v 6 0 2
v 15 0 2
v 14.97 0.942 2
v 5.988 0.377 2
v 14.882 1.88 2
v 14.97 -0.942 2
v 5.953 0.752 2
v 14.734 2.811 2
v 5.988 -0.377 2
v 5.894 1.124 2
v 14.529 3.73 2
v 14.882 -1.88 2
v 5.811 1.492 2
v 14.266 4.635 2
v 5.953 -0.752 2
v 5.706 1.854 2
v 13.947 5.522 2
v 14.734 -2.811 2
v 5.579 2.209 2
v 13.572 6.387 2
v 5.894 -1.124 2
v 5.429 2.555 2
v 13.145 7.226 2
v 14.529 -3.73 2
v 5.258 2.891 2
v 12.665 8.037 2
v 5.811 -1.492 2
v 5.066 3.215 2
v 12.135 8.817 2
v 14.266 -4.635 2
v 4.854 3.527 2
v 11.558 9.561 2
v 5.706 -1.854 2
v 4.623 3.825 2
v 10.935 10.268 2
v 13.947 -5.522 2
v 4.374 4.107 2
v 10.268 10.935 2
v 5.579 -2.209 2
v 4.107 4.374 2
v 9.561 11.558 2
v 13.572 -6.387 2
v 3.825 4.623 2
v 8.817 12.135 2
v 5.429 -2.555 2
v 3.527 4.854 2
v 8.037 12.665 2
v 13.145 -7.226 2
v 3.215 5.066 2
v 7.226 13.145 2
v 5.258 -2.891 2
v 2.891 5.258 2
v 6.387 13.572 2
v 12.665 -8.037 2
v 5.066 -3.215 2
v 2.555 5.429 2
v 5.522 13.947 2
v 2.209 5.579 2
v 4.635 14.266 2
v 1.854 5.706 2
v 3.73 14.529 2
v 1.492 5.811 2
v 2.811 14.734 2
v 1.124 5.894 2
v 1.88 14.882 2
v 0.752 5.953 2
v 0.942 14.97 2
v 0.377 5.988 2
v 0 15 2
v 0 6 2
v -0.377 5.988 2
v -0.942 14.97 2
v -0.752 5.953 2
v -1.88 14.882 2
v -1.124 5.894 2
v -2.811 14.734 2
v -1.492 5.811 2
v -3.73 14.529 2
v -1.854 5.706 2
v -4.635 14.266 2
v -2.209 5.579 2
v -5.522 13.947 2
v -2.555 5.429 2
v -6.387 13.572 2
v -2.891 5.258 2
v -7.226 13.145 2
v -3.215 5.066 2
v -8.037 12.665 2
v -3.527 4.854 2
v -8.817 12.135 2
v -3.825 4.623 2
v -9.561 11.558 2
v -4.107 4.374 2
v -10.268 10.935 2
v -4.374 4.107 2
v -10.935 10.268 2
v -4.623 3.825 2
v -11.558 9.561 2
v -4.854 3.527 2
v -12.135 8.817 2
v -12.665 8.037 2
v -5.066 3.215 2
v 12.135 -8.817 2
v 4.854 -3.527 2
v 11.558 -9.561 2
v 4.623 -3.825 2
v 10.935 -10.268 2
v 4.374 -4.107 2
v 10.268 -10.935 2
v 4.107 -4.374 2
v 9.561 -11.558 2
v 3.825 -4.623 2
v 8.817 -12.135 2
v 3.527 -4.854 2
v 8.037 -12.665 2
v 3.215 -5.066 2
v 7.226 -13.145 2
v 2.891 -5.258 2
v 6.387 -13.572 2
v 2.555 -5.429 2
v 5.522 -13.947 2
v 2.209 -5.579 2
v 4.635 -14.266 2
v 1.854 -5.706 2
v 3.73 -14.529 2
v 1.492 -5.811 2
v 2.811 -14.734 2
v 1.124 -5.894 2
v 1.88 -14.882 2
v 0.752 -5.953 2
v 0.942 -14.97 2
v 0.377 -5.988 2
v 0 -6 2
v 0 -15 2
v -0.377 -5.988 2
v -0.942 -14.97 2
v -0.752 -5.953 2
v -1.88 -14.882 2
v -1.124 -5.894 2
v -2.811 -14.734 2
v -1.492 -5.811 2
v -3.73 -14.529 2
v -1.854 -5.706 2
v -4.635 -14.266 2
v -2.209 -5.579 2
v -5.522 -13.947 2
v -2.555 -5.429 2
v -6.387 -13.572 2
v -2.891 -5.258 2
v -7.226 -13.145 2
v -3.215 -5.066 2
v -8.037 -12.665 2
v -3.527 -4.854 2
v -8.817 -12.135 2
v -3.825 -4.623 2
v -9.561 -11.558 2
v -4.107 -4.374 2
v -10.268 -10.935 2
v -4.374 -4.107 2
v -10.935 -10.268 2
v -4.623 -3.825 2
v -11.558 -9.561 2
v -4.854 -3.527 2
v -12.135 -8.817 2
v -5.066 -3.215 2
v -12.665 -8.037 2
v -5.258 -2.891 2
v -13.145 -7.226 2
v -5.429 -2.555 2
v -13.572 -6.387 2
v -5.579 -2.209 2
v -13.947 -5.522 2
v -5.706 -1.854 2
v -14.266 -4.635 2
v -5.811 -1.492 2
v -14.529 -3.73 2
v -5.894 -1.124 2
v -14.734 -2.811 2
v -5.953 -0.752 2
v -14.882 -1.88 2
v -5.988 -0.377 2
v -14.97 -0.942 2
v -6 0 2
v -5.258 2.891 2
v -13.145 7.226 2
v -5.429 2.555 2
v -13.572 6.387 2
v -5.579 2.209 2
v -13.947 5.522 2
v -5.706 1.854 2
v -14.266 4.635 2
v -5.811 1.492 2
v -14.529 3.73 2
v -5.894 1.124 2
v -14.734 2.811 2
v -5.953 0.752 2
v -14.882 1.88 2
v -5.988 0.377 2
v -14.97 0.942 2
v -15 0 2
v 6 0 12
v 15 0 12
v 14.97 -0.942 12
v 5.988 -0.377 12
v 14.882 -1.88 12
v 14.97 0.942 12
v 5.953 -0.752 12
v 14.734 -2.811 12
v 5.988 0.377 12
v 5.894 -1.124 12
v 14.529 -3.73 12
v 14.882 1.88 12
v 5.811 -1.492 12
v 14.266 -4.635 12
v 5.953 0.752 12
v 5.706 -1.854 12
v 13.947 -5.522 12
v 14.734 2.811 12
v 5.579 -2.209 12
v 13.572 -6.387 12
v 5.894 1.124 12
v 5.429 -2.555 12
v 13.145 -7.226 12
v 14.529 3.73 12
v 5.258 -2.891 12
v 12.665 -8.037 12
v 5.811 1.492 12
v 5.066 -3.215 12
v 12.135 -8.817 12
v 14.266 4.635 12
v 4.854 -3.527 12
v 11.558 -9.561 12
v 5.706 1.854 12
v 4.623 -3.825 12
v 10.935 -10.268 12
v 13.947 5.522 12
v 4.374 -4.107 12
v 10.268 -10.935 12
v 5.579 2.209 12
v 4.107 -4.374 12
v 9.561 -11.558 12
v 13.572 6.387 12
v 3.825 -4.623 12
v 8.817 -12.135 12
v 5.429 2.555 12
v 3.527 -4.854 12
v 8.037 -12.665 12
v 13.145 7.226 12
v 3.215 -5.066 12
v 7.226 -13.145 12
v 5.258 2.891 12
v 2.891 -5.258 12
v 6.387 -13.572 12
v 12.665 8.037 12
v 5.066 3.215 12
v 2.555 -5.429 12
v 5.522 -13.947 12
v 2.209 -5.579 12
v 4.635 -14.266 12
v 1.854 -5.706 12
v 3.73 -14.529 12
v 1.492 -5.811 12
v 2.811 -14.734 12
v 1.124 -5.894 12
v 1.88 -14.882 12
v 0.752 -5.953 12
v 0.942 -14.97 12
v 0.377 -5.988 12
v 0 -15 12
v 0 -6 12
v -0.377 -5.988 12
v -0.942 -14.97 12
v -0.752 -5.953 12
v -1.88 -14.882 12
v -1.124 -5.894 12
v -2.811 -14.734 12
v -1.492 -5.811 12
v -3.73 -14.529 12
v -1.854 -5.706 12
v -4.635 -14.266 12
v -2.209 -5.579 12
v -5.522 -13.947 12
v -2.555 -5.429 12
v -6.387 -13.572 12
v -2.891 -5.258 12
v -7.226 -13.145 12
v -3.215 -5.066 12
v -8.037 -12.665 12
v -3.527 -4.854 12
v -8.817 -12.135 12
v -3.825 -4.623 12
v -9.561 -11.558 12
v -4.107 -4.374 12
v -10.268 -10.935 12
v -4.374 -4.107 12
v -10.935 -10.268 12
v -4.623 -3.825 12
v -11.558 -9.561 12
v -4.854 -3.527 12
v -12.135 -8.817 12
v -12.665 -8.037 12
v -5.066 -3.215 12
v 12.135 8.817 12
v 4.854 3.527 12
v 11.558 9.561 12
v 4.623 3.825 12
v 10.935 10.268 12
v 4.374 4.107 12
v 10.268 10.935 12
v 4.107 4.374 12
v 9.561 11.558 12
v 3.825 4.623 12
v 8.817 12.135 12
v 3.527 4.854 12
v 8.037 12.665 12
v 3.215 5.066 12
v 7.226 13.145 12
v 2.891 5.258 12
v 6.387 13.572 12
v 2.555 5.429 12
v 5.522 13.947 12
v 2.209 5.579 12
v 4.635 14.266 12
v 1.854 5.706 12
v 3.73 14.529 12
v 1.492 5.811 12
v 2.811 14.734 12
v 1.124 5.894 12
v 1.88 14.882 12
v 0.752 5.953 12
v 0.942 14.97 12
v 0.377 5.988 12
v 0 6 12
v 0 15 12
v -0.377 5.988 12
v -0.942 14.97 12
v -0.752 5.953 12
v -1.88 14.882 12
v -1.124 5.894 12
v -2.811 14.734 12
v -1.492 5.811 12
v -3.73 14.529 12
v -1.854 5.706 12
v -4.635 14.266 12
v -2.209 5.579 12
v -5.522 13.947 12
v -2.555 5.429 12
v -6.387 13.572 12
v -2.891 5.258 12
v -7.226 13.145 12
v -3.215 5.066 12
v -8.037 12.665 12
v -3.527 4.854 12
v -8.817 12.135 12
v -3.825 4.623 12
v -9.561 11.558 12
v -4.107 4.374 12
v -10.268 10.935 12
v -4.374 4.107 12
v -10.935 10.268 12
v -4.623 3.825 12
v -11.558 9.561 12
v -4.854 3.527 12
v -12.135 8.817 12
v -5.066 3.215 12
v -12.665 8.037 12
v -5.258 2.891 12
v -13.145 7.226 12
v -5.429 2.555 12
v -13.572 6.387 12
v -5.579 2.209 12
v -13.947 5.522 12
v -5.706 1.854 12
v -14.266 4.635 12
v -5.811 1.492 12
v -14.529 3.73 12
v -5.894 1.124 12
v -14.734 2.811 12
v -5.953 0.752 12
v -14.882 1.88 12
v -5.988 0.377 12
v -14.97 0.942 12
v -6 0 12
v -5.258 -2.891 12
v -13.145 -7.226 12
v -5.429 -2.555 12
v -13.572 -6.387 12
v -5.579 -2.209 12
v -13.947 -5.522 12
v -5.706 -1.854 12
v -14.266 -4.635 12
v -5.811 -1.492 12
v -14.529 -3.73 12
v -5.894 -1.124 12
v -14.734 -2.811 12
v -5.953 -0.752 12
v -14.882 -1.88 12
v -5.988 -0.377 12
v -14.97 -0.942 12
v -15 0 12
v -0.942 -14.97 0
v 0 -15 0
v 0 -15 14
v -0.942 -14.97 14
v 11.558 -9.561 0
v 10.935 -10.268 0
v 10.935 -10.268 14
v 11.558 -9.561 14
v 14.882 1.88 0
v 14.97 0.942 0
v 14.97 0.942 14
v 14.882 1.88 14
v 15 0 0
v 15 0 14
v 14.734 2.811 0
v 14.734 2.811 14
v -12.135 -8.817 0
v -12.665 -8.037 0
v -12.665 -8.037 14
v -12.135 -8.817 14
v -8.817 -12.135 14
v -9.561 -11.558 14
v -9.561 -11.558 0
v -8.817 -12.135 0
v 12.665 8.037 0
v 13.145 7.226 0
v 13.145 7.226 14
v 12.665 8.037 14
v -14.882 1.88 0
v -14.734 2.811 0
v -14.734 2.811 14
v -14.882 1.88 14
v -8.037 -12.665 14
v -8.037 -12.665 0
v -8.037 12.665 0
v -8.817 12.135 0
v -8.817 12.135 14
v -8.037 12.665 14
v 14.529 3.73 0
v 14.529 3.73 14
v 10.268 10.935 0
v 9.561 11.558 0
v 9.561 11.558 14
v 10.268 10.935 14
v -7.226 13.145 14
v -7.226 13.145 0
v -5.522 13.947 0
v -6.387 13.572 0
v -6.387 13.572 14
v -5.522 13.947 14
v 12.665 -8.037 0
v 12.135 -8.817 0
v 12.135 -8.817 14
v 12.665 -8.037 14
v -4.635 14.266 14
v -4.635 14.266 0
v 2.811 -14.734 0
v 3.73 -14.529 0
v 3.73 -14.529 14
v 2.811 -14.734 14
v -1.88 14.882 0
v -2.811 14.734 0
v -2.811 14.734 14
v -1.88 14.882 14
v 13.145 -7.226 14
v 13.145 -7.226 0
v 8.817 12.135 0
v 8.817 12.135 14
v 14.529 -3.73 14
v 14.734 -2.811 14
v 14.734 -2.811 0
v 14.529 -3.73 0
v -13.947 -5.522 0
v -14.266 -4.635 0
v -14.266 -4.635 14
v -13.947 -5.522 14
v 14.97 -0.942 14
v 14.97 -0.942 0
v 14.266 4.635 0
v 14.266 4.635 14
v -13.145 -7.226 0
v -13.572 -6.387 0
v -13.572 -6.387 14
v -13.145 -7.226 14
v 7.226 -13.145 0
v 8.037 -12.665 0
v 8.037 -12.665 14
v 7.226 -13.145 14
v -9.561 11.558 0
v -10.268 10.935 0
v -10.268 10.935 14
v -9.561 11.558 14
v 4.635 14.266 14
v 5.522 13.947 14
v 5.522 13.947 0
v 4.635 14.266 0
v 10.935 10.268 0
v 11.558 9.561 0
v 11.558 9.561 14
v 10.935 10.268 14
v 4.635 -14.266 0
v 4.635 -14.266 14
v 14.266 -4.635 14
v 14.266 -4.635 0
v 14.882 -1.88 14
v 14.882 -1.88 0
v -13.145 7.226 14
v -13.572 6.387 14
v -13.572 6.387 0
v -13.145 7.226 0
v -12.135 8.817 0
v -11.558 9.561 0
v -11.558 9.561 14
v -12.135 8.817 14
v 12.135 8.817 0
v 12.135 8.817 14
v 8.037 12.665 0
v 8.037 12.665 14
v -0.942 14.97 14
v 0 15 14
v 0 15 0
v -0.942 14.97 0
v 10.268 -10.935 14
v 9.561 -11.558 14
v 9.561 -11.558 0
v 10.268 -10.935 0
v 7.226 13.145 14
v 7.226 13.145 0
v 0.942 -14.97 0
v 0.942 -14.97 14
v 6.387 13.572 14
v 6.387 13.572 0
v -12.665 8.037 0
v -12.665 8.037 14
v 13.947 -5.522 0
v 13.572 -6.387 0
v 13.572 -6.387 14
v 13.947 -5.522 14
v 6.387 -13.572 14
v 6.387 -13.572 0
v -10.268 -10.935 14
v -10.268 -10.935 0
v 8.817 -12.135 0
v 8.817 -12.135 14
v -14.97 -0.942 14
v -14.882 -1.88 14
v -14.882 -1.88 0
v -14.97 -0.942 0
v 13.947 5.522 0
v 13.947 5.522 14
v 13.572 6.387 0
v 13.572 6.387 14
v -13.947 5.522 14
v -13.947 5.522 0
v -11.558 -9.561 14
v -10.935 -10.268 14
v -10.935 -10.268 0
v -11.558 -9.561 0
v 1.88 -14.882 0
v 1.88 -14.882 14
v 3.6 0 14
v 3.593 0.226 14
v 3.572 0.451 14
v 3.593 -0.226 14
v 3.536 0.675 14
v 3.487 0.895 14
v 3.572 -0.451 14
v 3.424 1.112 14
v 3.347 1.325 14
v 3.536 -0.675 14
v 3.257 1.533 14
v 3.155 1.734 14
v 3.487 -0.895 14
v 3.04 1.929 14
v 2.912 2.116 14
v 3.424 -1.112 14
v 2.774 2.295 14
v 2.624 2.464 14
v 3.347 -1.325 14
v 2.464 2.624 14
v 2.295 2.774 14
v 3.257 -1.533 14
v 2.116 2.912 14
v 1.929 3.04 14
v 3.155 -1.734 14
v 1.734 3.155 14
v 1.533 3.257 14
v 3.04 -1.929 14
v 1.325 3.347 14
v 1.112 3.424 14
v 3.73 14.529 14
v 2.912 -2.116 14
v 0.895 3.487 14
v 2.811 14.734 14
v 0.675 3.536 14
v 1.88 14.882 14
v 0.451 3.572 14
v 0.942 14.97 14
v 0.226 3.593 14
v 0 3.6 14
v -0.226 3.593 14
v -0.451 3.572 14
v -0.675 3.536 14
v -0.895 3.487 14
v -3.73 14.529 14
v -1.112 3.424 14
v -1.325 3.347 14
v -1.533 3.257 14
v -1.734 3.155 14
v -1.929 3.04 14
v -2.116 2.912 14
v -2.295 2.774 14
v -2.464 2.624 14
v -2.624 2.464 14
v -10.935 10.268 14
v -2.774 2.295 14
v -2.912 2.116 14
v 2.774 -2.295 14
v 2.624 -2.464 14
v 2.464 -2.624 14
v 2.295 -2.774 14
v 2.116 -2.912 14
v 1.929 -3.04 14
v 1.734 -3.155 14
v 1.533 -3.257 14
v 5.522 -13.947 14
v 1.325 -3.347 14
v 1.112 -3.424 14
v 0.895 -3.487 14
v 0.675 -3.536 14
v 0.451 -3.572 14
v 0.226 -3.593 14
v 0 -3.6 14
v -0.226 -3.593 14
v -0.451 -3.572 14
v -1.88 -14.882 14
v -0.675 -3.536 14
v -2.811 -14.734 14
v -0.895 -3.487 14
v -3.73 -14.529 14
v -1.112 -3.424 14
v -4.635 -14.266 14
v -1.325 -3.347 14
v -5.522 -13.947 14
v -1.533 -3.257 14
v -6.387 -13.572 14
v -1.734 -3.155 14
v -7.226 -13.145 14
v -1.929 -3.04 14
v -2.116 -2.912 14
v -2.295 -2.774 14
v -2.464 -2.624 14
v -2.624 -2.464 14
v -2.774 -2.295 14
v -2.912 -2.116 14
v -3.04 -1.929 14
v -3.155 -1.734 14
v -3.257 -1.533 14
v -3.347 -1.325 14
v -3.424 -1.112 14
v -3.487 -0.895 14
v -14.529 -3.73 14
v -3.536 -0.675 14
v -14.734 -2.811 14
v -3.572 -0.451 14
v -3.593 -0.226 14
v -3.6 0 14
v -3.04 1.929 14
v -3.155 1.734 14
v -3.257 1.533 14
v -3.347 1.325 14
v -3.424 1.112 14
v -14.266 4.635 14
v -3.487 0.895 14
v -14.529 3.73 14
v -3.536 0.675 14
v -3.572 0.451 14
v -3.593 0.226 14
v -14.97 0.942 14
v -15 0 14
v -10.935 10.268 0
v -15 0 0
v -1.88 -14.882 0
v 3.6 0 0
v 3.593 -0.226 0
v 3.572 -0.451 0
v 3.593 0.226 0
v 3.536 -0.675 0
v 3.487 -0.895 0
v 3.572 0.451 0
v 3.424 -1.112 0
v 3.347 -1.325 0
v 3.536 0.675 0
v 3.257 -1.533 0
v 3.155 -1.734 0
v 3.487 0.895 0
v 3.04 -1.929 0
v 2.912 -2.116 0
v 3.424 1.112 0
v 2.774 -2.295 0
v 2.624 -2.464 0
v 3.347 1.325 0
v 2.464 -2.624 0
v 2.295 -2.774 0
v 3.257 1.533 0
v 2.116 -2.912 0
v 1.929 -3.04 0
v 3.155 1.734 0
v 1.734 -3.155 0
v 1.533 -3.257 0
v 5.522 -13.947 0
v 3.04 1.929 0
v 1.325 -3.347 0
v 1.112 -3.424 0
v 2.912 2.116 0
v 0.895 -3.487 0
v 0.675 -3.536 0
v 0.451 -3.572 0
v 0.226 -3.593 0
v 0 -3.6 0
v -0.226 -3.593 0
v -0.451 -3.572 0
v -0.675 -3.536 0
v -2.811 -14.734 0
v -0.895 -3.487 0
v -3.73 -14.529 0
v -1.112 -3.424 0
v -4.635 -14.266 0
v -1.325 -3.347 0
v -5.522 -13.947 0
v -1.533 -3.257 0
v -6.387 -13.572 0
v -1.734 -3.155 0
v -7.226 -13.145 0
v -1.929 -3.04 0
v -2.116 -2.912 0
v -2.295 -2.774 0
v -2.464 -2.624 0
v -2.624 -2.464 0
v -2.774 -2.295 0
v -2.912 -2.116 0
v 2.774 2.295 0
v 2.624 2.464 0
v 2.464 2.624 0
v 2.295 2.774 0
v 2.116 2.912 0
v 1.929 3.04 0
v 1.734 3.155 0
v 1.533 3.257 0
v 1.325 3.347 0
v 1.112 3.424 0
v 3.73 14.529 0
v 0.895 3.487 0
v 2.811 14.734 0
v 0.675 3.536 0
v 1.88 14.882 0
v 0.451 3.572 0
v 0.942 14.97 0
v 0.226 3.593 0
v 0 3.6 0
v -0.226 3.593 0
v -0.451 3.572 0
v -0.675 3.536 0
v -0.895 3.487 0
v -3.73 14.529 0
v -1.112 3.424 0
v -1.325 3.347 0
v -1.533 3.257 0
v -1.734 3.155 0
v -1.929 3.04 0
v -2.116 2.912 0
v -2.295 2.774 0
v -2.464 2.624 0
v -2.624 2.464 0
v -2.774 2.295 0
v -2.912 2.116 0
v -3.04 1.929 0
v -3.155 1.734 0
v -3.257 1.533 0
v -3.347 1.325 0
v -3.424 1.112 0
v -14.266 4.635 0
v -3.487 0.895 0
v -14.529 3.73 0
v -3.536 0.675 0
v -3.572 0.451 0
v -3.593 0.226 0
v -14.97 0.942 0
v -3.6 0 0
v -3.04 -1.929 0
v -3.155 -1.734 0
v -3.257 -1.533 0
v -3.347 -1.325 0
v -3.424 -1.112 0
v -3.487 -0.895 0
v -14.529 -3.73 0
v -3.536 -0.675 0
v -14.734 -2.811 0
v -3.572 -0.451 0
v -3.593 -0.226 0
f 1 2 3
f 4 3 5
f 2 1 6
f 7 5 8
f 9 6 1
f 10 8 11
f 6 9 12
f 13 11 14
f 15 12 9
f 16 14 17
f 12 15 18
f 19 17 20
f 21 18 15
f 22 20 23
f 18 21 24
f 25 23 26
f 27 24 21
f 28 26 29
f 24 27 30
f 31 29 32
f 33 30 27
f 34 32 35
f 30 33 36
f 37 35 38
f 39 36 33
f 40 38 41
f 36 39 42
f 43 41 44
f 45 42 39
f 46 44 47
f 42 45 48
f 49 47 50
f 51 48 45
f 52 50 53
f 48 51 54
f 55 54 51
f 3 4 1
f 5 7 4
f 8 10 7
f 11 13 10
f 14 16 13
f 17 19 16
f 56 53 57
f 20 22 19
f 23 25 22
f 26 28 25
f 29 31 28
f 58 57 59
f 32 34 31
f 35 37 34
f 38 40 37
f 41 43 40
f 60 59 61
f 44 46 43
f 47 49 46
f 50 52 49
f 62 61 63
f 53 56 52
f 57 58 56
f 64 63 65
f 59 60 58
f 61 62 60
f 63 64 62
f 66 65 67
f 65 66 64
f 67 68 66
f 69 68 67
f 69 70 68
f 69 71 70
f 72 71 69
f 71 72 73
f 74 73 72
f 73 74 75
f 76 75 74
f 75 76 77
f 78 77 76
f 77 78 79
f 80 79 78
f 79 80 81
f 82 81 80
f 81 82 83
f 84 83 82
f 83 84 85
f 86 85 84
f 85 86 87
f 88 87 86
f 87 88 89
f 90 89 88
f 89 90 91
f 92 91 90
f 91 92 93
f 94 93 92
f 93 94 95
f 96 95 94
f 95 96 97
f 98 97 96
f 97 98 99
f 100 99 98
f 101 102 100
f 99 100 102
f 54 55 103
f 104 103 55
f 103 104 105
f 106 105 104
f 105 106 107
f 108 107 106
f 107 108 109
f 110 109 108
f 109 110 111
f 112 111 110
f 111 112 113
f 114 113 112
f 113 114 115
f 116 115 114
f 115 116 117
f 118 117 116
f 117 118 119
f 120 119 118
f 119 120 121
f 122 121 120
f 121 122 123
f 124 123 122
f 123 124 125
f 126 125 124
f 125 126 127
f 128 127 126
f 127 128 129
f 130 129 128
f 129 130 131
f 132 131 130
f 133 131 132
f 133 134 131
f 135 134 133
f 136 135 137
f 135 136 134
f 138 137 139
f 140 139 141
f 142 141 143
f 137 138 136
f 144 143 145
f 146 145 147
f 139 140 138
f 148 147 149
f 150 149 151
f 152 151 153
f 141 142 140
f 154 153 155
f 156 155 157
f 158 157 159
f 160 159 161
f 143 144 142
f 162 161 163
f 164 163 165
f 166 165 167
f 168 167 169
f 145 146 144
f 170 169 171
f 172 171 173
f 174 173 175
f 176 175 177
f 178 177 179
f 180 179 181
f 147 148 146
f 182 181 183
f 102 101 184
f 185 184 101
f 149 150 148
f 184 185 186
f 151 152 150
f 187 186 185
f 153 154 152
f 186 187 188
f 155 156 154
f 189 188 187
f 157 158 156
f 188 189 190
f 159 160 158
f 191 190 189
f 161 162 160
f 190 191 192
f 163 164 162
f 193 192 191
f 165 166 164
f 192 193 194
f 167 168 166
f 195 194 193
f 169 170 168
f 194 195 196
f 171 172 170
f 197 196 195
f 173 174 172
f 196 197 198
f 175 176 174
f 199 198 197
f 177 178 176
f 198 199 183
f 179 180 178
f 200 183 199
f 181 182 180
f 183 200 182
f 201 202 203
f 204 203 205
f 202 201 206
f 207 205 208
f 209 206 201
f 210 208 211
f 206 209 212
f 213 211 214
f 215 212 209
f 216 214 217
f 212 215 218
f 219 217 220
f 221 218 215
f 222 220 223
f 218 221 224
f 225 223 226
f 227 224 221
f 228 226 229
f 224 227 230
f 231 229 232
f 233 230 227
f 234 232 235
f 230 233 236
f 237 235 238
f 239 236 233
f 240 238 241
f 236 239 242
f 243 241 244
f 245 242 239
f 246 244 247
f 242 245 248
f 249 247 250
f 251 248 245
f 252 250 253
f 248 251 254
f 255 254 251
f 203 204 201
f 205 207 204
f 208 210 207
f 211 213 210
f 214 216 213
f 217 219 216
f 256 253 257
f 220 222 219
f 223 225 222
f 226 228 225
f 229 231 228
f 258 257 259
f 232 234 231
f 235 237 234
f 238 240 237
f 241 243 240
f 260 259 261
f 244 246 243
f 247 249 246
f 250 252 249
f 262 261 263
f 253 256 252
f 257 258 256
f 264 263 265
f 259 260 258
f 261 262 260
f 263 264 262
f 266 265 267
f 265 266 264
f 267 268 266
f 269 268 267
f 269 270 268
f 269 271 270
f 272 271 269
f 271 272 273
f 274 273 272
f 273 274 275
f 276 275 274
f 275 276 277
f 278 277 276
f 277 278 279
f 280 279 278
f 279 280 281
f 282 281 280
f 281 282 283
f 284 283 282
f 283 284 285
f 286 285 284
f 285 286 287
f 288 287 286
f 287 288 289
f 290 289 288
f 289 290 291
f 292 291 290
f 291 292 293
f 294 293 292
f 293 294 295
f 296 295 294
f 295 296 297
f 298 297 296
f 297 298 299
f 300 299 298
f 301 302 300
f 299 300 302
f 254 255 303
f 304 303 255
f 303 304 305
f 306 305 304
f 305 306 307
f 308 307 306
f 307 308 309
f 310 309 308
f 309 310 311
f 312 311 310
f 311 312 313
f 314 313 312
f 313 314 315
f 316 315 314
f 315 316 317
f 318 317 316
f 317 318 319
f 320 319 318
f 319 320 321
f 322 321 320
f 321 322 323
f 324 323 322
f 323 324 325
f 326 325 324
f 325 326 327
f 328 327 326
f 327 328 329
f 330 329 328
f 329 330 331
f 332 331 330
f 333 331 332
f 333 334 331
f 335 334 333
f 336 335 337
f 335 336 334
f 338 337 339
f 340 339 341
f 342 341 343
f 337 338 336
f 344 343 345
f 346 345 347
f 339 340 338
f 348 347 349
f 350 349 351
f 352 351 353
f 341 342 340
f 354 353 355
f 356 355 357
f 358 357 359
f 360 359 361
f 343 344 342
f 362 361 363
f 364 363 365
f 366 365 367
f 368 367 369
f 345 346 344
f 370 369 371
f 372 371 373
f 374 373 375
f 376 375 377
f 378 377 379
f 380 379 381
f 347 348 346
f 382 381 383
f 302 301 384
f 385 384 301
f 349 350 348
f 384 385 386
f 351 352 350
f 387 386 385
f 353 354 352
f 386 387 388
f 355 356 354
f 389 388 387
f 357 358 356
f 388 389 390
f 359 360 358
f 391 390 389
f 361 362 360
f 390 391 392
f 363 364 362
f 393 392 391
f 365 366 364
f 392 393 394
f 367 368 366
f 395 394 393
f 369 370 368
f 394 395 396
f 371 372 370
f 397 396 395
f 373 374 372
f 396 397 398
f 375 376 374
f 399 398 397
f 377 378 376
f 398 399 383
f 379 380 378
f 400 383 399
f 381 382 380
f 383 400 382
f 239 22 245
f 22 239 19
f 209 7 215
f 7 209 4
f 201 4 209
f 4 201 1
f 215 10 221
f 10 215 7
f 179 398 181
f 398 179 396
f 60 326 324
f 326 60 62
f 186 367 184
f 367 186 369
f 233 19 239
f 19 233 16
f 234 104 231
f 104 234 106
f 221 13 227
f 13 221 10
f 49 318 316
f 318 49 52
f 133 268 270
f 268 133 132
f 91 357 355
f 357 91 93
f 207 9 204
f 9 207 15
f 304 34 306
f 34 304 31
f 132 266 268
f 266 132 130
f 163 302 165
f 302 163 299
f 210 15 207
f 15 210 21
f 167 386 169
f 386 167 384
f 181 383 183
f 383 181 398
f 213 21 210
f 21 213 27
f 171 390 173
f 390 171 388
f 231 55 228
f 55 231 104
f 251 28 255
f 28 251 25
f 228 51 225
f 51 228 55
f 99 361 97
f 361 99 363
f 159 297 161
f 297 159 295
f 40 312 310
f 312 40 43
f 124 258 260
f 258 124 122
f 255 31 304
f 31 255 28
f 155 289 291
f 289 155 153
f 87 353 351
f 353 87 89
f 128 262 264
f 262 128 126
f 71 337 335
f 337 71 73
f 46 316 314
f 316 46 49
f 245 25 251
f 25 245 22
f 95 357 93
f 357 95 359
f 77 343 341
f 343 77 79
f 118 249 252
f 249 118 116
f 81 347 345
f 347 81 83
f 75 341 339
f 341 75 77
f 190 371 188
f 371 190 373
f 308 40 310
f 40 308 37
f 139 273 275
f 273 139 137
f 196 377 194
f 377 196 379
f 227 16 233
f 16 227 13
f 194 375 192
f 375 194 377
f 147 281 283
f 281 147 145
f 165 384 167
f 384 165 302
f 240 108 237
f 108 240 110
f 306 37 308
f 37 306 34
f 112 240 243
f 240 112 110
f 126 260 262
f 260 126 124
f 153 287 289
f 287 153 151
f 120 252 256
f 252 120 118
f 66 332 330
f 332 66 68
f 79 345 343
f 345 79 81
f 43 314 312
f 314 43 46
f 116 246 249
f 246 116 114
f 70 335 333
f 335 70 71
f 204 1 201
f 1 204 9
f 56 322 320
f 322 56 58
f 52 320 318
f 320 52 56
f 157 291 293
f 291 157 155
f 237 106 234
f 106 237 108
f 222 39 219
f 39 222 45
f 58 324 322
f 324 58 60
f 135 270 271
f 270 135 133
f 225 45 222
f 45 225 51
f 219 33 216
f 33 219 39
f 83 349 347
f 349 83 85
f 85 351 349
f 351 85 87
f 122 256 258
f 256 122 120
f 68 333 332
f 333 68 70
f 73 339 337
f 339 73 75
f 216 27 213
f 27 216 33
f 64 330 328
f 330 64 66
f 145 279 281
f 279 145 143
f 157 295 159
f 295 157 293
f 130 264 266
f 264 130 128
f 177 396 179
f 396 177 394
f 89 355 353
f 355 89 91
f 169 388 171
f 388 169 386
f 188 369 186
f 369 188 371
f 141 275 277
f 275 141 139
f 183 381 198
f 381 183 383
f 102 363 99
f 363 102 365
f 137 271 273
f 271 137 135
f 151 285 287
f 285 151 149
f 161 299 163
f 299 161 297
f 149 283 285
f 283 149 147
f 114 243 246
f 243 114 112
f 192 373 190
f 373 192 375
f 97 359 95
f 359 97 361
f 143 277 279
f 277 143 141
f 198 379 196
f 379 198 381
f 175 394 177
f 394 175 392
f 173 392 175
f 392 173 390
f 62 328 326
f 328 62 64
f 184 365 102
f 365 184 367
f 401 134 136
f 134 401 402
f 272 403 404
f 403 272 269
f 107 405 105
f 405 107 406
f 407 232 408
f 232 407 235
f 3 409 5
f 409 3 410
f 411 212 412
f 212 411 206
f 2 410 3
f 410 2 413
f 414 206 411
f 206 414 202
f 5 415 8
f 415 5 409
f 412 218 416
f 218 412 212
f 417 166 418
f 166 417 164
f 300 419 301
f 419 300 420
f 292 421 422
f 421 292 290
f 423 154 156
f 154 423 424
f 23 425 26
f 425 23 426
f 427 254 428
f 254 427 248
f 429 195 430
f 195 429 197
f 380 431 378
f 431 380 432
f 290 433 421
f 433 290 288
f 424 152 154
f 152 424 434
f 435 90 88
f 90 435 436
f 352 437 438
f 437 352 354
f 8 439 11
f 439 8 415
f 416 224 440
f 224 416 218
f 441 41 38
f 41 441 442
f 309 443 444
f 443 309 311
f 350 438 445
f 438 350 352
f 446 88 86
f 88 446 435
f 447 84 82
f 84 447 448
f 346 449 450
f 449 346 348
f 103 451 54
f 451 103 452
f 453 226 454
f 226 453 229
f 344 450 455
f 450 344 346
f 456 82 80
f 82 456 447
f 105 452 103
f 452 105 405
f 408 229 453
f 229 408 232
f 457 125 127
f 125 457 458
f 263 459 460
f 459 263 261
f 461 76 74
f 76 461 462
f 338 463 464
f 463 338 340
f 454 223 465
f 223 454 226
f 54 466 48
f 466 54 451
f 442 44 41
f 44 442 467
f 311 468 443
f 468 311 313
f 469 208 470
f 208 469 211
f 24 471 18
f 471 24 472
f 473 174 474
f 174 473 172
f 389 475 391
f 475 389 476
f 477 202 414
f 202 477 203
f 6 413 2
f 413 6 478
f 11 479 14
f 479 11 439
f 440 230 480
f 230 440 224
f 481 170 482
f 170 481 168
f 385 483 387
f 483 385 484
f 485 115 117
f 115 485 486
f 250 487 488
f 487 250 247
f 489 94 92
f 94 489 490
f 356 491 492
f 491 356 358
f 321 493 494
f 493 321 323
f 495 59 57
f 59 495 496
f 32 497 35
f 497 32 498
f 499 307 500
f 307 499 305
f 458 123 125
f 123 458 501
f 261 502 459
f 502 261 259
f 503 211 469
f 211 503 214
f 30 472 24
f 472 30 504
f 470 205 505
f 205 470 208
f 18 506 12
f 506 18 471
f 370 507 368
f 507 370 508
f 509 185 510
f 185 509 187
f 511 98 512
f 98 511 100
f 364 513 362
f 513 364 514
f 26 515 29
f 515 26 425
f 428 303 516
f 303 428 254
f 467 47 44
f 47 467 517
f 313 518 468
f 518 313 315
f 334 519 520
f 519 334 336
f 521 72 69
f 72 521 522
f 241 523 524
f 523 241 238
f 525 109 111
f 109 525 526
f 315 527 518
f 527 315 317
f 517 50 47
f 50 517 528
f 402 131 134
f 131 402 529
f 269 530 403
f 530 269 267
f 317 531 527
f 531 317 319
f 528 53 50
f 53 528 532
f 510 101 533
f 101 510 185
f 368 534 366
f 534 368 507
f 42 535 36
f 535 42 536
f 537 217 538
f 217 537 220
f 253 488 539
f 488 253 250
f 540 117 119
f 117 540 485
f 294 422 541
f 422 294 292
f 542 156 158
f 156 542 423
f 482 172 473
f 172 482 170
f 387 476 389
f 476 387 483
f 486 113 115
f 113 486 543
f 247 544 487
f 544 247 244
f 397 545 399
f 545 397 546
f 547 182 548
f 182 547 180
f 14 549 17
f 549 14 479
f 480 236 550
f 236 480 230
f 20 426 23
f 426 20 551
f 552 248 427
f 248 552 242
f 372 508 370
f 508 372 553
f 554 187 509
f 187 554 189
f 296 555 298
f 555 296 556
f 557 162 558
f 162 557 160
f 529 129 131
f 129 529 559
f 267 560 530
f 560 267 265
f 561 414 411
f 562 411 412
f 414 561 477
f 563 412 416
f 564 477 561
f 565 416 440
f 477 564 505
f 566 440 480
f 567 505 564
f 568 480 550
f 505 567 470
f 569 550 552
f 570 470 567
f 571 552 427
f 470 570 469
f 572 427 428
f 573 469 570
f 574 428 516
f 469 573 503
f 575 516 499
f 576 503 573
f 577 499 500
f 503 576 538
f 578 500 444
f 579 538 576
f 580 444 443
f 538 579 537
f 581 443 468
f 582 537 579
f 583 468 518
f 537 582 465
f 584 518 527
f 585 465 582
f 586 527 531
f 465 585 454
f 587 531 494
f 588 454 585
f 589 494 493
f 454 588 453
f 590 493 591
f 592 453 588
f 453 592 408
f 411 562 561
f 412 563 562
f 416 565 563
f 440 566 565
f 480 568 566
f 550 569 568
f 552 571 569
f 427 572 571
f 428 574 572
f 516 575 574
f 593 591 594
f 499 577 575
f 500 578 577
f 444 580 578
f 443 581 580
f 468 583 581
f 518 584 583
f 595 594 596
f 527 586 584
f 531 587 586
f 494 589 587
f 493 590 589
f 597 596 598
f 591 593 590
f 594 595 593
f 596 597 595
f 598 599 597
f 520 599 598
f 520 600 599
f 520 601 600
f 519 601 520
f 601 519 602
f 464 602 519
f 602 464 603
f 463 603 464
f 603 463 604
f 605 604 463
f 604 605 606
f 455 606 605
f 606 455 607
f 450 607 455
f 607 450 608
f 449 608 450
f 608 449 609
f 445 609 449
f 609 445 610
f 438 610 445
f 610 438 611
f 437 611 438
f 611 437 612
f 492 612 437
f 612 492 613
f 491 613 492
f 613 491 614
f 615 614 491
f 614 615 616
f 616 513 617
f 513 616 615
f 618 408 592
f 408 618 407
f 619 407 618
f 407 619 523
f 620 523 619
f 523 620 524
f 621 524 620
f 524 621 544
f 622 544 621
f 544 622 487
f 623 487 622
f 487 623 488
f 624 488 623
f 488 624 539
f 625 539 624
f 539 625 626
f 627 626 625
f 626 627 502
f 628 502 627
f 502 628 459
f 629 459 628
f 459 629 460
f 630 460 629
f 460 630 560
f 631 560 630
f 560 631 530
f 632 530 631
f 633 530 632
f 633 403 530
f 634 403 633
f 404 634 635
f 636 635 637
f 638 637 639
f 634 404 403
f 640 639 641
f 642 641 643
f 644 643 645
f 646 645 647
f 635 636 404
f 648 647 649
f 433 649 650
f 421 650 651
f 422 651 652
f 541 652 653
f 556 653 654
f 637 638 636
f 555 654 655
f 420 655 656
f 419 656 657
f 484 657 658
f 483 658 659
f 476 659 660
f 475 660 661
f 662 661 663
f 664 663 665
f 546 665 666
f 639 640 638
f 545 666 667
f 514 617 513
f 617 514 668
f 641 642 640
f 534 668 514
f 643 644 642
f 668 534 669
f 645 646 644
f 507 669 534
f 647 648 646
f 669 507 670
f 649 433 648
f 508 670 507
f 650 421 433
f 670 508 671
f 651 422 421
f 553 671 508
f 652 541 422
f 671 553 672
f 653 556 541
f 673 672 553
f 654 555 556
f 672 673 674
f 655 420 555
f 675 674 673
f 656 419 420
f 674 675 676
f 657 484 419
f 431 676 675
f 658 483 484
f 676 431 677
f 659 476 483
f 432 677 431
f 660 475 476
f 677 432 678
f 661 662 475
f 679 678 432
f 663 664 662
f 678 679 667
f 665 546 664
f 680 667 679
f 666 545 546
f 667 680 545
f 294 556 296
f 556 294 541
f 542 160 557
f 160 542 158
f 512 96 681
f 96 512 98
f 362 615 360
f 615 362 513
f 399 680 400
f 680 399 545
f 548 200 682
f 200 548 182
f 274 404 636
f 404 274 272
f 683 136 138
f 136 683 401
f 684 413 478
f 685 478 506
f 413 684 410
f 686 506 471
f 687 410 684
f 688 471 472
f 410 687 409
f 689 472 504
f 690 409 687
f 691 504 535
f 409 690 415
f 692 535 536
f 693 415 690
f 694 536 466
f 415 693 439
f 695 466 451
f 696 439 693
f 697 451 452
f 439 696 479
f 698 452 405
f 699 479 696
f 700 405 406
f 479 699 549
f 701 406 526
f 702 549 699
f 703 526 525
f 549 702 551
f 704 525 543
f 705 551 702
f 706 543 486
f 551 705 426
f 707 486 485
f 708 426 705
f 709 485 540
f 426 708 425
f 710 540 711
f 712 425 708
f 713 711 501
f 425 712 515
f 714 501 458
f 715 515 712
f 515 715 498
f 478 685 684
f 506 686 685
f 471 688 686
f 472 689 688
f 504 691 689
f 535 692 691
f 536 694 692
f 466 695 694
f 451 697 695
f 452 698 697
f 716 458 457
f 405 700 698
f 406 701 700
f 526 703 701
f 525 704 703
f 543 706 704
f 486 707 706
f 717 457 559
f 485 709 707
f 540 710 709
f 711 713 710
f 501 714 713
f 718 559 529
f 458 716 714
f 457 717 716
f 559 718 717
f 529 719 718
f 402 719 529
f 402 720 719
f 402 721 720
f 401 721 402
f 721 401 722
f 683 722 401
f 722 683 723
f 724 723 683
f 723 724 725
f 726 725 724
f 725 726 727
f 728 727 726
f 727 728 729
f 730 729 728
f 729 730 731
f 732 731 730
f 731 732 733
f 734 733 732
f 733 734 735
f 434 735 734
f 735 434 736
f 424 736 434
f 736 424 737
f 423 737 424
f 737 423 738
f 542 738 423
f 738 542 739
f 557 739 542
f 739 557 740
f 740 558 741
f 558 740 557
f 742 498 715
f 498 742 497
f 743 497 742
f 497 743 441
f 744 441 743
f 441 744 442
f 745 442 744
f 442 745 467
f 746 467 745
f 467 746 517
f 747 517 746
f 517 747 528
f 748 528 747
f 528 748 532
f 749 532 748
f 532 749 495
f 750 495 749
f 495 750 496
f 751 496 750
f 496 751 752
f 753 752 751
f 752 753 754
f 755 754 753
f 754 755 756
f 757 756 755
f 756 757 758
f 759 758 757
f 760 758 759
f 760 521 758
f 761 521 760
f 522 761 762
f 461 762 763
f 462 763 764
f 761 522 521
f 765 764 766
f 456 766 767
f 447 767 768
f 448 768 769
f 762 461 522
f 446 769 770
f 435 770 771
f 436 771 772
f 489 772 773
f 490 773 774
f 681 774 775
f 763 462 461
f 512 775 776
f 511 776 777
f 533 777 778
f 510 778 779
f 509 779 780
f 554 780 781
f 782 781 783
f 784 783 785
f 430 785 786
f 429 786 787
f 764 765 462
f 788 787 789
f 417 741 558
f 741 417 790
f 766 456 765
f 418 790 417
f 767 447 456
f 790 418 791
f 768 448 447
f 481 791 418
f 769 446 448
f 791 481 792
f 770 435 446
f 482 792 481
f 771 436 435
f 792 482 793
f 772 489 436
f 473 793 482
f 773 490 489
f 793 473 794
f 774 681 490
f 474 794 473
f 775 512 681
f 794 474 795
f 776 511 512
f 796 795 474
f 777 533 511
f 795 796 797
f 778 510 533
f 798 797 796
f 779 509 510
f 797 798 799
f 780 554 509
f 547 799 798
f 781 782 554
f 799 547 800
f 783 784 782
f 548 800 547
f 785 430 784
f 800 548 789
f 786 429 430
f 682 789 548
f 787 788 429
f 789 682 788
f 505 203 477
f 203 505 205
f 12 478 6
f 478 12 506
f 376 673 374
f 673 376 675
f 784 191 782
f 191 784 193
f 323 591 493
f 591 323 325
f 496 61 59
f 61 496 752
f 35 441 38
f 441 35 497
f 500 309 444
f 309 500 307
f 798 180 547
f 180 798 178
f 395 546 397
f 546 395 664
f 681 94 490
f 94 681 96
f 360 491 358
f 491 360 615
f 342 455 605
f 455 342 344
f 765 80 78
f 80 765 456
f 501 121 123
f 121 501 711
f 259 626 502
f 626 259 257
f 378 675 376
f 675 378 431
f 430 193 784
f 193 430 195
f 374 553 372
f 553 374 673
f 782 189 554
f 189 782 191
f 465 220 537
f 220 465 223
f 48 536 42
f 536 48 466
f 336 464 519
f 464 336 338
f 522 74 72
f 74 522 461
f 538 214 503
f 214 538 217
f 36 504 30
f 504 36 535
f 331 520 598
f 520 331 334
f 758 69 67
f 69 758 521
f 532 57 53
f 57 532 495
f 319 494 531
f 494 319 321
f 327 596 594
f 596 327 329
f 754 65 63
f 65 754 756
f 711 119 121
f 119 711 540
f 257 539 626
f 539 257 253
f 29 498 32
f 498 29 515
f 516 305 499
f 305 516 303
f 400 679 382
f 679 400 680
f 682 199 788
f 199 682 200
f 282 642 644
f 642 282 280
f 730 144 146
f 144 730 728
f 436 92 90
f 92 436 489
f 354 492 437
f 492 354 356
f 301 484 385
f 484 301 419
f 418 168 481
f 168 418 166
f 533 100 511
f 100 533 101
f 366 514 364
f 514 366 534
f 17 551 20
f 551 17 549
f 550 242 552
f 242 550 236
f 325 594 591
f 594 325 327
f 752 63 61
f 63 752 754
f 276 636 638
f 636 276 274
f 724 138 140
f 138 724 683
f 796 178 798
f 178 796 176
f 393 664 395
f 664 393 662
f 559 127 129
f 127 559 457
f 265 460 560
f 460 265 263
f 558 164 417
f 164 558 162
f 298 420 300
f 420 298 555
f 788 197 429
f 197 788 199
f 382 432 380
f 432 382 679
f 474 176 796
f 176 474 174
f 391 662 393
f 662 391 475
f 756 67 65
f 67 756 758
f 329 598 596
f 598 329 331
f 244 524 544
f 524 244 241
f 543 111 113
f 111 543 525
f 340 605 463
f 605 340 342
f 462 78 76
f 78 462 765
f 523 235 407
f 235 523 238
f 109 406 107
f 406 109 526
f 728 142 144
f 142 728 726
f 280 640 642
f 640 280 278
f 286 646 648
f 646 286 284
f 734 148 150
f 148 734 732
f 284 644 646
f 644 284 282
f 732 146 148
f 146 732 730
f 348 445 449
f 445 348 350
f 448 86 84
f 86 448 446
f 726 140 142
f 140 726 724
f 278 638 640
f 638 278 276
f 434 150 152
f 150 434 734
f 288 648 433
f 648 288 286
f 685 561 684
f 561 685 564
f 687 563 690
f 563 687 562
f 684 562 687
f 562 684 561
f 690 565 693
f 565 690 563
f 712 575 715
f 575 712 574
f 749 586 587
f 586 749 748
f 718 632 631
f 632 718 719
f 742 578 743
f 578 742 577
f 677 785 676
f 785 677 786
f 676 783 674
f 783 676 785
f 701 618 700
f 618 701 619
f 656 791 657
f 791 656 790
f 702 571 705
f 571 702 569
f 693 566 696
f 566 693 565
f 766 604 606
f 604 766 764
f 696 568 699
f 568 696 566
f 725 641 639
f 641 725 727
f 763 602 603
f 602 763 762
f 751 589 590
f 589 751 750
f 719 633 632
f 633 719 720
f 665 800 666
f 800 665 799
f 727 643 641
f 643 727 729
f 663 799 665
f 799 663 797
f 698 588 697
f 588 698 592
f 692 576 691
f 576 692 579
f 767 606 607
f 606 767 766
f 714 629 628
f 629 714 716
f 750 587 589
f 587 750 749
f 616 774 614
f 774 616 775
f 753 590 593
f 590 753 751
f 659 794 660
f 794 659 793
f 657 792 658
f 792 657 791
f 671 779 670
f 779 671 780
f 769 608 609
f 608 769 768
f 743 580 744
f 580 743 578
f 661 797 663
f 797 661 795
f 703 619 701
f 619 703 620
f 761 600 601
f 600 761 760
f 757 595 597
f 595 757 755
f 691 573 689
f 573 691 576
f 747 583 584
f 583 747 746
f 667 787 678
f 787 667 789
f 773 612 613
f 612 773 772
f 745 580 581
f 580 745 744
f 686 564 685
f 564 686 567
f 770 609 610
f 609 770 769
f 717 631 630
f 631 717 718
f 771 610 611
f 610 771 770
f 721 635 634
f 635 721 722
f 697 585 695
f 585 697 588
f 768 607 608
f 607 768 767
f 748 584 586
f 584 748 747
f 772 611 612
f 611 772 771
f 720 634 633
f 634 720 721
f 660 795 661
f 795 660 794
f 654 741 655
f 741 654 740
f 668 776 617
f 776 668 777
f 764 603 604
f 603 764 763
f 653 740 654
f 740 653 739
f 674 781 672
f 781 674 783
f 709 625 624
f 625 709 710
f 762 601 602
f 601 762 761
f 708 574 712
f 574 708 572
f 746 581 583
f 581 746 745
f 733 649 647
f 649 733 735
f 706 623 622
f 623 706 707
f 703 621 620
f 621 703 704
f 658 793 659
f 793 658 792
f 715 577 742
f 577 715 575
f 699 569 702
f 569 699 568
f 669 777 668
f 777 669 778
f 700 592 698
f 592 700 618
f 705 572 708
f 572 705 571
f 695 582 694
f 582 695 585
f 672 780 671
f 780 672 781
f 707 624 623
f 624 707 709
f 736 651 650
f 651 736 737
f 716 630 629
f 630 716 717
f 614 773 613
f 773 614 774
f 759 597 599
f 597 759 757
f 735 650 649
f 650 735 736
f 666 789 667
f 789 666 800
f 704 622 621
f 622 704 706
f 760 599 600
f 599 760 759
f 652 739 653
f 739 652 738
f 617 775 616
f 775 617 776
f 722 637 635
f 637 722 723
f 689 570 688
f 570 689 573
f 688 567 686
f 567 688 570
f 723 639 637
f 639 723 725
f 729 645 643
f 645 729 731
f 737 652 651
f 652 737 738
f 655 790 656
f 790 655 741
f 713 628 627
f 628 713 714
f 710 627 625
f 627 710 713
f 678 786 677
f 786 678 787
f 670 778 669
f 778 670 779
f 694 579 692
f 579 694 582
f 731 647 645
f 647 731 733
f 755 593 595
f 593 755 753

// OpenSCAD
$fn=100;

difference(){
  cylinder(d=30,h=14);
  translate([0,0,-1])cylinder(d=7.2,h=17);
   translate([0,0,2]) difference(){
    cylinder(d=32,h=10);
    translate([0,0,-1])cylinder(d=12,h=17);
   }
}
